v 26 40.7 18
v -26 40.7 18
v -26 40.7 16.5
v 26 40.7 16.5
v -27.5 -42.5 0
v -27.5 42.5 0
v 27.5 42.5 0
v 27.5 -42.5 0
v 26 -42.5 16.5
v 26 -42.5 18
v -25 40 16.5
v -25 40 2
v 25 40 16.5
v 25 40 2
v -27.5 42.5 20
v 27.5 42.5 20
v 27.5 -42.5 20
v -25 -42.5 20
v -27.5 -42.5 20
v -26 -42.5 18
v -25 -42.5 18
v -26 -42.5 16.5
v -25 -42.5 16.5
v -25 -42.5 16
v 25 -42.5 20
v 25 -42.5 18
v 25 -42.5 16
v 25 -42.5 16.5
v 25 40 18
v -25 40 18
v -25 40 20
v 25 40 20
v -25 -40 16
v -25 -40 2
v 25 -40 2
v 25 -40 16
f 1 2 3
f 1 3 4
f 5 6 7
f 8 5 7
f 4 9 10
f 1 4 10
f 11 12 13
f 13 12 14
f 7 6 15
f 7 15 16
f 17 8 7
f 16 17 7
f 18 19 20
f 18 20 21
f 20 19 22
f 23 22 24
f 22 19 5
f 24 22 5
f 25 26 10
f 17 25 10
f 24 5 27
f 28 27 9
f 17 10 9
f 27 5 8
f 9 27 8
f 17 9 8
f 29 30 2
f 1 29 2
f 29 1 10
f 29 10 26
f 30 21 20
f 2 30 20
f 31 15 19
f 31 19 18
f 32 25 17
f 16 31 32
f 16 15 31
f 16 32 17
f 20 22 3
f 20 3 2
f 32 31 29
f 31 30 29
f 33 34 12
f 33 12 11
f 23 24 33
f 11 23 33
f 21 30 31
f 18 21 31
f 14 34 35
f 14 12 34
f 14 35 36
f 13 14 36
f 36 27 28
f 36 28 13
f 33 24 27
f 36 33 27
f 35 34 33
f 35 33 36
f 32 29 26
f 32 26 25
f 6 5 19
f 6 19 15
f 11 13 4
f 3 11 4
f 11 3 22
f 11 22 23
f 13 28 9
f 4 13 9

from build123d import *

# Parameters (mm, degrees)
F0_W     = 55
F0_H     = 85
F0_W_2   = 50
F0_H_2   = 80
F1_DEPTH = 2
F2_DEPTH = 20
F3_W     = 50
F3_H     = 4
F4_DEPTH = 82.5
F5_W     = 50
F5_H     = 1.5
F5_W_2   = 1
F6_DEPTH = 83.2


with BuildPart() as f1:
    # F0 (on Top) → F1 (new body)
    with BuildSketch(Plane.XY):
        Rectangle(F0_W, F0_H)
        Rectangle(F0_W_2, F0_H_2, mode=Mode.SUBTRACT)
        Rectangle(F0_W_2, F0_H_2)
    extrude(amount=F1_DEPTH)

    # F0 (on Top) → F2 (join)
    with BuildSketch(Plane.XY):
        Rectangle(F0_W, F0_H)
        Rectangle(F0_W_2, F0_H_2, mode=Mode.SUBTRACT)
    extrude(amount=F2_DEPTH)

    # F3 (on face) → F4 (cut, through all)
    with BuildSketch(Plane.XZ.offset(42.5)):
        with Locations((0, 18)):
            Rectangle(F3_W, F3_H)
    extrude(amount=-F4_DEPTH, mode=Mode.SUBTRACT)

    # F5 (on face) → F6 (cut)
    with BuildSketch(Plane.XZ.offset(42.5)):
        with Locations((0, 17.25)):
            Rectangle(F5_W, F5_H)
        with Locations((-25.5, 17.25)):
            Rectangle(F5_W_2, F5_H)
        with Locations((25.5, 17.25)):
            Rectangle(F5_W_2, F5_H)
    extrude(amount=-F6_DEPTH, mode=Mode.SUBTRACT)


solid = f1.part
